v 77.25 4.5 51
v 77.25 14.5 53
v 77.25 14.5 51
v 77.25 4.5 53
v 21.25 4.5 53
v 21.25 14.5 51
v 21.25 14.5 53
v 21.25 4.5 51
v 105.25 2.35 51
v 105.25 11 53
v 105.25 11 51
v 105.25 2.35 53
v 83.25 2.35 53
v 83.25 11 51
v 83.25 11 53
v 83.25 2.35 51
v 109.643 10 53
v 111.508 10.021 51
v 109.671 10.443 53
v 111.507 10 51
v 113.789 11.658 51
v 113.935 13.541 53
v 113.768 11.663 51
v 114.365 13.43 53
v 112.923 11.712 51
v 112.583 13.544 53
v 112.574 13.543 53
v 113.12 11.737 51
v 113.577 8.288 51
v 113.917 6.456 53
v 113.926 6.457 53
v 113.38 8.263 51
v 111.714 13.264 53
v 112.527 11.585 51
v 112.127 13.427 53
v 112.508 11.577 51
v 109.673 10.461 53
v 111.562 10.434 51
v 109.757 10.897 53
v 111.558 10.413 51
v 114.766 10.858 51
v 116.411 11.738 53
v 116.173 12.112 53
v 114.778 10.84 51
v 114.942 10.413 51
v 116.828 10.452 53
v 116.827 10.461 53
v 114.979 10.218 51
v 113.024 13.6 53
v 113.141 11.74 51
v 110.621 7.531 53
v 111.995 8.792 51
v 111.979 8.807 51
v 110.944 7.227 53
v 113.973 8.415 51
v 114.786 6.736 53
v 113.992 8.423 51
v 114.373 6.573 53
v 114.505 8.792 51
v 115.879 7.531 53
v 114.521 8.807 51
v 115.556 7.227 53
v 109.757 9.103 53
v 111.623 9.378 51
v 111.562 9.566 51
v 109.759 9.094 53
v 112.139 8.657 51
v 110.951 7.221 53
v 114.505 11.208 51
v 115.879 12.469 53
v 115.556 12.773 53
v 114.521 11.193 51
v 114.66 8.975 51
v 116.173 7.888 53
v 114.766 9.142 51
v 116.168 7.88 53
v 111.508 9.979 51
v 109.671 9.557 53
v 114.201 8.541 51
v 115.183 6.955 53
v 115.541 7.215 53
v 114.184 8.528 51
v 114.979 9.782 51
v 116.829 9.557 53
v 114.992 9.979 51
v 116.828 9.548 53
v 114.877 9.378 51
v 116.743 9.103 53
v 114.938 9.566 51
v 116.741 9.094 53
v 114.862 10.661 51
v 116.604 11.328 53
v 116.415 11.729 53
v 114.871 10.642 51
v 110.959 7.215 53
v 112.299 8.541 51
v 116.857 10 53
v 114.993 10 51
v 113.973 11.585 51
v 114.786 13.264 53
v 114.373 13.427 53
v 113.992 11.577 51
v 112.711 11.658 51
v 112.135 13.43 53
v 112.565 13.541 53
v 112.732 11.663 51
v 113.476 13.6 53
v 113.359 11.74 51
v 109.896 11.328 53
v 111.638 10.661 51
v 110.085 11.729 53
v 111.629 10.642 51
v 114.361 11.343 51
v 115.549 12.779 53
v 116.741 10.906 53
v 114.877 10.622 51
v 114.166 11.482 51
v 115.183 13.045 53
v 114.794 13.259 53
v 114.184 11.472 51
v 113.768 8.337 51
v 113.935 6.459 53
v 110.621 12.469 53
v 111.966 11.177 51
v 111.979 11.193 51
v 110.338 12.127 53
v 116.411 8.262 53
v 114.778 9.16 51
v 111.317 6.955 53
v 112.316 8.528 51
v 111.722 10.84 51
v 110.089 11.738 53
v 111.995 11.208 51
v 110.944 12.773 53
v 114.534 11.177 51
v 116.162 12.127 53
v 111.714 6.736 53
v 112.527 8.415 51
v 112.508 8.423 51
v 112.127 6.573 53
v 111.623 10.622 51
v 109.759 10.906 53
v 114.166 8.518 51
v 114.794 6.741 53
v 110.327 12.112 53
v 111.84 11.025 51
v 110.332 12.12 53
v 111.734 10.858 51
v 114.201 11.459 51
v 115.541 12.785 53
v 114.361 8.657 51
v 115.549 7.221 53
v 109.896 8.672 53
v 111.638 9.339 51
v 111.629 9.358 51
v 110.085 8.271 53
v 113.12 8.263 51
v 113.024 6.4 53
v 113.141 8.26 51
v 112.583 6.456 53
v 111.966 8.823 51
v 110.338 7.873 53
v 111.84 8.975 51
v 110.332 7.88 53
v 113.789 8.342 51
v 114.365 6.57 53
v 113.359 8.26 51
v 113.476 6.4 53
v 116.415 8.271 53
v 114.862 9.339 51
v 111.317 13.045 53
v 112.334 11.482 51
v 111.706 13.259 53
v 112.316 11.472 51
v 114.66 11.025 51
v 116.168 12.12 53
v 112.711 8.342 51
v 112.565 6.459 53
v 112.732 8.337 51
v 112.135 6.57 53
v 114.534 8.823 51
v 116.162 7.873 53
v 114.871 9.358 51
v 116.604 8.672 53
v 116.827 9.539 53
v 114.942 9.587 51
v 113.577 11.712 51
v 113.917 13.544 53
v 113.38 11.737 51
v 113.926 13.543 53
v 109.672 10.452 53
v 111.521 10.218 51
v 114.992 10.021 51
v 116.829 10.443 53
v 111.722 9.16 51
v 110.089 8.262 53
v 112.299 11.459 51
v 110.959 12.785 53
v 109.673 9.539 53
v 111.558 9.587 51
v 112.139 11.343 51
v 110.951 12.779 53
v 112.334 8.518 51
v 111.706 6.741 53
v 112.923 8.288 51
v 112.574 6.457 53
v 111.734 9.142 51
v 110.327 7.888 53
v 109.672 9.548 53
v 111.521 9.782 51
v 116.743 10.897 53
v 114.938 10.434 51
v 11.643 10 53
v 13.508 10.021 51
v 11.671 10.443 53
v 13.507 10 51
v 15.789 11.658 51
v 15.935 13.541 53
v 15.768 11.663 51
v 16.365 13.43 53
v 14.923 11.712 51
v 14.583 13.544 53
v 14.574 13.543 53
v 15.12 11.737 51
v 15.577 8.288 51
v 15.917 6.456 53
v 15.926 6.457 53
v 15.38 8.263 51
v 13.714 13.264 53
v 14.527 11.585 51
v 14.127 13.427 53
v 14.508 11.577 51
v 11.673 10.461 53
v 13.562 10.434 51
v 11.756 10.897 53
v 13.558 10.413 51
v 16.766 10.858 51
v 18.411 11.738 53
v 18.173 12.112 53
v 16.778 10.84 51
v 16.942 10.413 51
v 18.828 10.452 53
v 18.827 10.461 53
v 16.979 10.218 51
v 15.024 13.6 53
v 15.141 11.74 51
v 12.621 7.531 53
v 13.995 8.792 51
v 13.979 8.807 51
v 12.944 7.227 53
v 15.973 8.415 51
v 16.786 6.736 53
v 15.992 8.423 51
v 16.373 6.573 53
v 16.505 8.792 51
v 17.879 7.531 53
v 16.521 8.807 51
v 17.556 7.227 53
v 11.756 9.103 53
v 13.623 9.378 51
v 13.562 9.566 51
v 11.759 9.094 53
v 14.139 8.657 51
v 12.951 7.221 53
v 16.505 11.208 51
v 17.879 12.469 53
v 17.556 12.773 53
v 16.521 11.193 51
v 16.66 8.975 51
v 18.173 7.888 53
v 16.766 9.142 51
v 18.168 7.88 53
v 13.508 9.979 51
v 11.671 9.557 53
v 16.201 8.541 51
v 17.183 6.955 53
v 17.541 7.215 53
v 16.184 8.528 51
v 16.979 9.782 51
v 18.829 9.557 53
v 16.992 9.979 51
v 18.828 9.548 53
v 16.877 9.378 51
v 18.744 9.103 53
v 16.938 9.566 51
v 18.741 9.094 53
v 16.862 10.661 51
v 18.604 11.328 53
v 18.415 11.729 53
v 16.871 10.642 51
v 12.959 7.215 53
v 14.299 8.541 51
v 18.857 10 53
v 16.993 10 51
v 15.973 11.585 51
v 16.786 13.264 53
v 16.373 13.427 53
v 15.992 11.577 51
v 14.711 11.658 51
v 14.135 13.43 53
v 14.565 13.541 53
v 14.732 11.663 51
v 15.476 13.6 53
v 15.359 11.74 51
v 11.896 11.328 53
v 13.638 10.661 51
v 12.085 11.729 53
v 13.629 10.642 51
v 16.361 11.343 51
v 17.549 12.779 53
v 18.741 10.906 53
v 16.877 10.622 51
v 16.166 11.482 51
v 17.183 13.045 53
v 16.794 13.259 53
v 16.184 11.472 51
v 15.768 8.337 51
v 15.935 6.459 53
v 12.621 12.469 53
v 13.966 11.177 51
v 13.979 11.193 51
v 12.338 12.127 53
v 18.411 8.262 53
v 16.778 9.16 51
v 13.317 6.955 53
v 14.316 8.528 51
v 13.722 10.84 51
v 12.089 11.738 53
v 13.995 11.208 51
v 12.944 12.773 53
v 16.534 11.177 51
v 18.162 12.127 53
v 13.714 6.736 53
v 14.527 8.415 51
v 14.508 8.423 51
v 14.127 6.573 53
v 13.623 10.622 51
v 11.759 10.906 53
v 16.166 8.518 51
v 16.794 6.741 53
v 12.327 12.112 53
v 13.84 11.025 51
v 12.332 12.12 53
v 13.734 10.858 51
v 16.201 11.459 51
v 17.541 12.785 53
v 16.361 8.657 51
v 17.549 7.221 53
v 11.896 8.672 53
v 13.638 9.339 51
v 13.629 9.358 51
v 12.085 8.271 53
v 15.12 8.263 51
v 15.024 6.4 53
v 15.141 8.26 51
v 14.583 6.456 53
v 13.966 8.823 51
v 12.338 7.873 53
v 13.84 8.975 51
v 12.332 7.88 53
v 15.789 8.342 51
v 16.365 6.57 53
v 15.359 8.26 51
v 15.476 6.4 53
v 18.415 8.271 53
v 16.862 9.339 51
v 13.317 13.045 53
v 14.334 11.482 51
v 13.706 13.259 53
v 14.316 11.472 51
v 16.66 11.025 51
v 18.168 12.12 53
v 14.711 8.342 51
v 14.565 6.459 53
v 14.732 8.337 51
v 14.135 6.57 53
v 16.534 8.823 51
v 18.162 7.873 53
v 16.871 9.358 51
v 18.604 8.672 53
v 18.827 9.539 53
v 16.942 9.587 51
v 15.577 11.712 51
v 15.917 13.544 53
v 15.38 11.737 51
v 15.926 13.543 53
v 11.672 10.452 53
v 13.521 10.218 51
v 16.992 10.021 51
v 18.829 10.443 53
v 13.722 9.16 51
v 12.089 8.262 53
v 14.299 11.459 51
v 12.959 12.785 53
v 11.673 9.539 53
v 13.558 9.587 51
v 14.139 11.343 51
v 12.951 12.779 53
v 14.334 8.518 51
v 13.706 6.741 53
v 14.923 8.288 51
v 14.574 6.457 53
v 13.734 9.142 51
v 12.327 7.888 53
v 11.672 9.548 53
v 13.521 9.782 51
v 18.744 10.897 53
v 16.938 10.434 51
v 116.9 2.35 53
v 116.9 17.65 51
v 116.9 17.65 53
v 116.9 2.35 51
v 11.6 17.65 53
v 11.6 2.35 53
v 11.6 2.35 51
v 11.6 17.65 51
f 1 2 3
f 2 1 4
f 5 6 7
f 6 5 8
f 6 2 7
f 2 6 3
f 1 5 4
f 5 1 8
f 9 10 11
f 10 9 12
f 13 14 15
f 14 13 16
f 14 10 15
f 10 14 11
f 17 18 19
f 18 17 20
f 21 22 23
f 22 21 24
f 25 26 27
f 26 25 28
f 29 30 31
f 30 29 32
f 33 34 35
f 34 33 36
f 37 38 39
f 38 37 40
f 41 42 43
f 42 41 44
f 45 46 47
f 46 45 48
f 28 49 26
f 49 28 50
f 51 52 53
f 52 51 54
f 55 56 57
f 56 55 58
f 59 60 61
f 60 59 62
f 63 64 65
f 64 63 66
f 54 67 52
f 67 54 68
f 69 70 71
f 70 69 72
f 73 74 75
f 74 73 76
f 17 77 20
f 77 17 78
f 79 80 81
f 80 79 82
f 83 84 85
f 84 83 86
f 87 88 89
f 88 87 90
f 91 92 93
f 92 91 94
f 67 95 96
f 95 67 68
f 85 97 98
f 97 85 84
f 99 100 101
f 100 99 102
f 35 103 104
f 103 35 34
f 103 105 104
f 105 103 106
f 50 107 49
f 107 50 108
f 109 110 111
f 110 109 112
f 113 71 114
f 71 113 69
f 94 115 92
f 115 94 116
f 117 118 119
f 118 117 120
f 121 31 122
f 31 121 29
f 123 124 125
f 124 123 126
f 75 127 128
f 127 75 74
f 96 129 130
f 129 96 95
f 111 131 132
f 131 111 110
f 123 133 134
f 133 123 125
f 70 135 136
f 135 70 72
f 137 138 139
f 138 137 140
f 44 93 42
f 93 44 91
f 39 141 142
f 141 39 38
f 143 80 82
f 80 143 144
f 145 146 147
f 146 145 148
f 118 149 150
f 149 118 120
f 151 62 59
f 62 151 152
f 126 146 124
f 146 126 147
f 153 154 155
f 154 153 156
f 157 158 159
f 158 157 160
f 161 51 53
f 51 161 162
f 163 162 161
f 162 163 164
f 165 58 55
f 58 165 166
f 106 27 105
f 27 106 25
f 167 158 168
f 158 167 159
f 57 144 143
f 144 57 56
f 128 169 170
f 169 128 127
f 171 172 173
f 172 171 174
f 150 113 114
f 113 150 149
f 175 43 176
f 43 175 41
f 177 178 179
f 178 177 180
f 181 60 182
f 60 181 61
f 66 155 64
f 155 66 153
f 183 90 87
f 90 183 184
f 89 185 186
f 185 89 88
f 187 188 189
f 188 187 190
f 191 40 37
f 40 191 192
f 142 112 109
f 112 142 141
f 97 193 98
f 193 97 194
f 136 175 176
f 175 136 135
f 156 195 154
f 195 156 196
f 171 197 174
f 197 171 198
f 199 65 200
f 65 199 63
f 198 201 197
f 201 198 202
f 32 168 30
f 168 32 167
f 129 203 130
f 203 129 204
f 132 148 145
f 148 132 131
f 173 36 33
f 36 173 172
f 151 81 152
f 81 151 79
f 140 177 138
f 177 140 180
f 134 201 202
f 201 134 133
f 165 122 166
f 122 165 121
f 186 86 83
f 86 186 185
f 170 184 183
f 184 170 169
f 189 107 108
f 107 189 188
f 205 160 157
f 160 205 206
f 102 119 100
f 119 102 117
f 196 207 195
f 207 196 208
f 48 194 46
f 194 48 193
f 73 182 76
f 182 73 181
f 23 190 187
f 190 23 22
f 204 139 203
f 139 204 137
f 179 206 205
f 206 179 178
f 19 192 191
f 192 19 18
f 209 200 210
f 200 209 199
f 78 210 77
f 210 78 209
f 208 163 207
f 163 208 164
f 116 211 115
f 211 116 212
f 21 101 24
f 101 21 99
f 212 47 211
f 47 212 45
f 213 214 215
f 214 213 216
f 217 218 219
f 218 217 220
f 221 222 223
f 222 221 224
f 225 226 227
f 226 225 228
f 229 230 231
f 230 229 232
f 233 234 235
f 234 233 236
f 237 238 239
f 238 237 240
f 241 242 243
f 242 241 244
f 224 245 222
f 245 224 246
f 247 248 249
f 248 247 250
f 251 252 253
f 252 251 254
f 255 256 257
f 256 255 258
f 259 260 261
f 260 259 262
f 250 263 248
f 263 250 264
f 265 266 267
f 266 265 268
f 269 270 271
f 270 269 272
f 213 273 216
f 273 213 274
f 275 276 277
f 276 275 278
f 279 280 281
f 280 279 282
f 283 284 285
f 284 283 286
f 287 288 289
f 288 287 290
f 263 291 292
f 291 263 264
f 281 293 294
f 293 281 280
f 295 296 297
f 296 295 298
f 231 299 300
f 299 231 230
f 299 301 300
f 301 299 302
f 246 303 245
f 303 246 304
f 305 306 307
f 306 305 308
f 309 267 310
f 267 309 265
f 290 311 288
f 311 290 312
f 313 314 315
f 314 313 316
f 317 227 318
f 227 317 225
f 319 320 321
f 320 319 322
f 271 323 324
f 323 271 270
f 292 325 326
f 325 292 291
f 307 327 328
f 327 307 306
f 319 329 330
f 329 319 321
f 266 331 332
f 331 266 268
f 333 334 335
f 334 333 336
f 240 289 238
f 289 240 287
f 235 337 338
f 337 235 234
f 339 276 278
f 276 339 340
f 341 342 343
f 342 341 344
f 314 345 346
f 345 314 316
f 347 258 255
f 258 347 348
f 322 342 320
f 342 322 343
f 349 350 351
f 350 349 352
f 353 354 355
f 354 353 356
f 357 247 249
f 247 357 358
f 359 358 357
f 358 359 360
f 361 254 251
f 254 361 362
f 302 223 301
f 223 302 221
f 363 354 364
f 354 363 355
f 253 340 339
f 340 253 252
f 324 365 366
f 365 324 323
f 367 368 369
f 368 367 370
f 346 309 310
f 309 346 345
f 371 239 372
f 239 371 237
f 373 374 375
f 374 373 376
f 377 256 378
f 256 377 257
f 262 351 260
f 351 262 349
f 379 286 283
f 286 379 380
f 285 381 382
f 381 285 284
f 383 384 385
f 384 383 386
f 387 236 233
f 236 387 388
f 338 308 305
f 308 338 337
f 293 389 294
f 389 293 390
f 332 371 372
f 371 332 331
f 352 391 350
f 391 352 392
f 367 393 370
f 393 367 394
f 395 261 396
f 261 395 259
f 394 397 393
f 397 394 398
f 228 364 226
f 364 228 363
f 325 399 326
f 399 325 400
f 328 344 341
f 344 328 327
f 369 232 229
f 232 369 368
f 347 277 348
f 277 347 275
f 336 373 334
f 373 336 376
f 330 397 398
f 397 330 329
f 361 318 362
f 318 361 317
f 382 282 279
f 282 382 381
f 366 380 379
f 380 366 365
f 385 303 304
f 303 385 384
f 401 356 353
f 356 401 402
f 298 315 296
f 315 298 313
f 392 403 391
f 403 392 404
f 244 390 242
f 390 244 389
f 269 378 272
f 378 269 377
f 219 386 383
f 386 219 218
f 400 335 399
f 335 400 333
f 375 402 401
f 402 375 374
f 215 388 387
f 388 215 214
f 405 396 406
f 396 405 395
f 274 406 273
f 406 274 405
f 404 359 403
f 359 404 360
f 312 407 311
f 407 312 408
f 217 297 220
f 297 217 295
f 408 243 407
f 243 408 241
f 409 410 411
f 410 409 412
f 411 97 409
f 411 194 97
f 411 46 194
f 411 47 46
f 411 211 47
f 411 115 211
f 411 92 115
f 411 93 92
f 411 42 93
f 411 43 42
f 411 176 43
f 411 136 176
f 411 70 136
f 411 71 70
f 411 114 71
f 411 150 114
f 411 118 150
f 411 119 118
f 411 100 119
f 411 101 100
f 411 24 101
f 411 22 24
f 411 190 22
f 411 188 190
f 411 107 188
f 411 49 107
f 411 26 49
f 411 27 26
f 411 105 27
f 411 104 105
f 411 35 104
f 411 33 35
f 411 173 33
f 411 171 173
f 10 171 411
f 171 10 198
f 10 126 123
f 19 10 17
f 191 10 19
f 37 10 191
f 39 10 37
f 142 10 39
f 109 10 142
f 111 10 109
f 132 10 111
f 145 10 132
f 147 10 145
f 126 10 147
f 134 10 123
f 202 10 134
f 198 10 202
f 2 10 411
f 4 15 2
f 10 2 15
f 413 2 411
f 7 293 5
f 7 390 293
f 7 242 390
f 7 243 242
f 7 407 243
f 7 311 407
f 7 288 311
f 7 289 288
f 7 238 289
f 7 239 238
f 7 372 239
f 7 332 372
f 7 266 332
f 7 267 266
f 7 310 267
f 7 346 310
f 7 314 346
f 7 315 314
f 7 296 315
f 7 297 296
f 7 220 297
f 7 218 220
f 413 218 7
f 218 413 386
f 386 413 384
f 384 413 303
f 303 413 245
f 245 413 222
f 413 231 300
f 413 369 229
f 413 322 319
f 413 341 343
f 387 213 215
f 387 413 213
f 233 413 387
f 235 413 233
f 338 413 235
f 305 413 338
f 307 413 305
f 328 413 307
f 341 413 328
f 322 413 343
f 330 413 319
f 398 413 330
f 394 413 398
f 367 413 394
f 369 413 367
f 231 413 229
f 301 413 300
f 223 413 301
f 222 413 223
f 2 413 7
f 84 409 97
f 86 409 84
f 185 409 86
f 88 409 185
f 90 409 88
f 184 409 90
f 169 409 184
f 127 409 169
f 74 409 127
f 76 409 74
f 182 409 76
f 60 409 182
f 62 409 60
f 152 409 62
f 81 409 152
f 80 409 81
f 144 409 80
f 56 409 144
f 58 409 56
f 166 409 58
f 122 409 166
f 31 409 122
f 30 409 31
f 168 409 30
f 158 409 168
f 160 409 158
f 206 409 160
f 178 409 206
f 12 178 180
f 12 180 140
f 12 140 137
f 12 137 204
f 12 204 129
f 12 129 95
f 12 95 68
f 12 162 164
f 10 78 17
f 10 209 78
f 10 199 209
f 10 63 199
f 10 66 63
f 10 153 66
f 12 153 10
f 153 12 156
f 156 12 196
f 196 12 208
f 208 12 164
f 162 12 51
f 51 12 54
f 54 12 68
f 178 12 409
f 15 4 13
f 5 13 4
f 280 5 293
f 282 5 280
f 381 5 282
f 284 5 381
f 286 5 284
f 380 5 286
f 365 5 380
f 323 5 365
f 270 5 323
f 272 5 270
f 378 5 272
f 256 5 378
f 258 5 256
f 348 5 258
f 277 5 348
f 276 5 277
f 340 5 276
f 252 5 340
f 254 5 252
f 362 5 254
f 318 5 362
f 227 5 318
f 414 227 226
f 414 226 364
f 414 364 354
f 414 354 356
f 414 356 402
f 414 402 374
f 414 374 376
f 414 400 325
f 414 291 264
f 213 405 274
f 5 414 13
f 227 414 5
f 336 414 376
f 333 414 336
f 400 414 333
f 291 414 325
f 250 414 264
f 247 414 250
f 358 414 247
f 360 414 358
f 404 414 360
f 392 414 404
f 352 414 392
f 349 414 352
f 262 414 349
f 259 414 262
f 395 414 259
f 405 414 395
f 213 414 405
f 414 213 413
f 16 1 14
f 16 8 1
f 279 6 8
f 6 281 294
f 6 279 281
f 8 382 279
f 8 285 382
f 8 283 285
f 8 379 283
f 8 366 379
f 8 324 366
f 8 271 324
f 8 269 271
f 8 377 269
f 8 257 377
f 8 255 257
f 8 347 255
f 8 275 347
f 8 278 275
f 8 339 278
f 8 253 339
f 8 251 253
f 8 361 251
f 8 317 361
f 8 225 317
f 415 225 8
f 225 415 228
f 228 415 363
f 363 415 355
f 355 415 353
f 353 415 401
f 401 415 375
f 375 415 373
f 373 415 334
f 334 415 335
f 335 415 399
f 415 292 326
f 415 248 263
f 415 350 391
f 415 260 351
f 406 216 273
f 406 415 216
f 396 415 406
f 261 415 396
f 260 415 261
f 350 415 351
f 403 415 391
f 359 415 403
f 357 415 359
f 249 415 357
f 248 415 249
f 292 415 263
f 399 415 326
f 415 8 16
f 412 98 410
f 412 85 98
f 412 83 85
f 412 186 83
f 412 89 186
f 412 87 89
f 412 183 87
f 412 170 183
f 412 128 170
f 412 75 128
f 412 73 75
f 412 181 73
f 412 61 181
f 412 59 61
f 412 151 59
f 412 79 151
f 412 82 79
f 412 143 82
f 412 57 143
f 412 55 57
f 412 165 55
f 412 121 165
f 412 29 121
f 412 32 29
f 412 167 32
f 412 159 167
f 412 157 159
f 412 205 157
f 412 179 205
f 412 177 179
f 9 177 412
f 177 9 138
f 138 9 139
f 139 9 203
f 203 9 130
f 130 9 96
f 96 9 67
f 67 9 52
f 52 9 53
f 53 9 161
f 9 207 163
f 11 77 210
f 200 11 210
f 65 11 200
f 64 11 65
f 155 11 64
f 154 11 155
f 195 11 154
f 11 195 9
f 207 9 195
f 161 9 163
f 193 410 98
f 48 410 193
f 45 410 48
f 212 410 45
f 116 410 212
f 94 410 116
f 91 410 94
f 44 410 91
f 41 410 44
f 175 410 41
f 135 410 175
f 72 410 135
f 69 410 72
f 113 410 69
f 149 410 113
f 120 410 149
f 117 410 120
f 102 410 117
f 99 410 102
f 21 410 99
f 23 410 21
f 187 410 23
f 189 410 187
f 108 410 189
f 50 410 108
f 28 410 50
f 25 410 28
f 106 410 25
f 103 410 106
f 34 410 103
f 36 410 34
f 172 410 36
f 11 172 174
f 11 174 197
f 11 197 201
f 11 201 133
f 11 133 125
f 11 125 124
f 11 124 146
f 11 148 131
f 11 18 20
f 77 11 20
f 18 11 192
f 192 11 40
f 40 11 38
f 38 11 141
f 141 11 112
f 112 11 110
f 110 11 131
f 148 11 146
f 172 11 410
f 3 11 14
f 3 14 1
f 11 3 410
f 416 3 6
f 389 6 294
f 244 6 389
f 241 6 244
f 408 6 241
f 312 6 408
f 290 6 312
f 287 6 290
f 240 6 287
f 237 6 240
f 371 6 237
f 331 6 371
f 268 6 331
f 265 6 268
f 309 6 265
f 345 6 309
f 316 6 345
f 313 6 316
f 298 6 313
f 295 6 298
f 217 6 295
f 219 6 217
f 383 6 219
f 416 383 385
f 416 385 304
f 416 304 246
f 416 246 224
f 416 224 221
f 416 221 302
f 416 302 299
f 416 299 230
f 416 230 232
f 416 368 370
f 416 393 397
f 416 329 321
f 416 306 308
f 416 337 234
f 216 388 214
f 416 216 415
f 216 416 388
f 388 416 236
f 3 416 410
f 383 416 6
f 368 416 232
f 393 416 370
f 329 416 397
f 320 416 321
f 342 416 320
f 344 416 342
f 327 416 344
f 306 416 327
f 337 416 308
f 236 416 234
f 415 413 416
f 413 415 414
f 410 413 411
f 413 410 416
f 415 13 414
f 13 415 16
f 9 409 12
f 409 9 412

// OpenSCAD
include<../sixinch_library.scad>

print_frontplate_sml = false;
print_cabinet_sml    = false;
print_lid            = false;
print_rear           = true;


Vent_Length          = 22;
Vent_Frequency       = 6;
Vent_Thickness       = 3;
standoff_hole_size   = 2.3;//2.3 for m2.5, 2.8 for m3
Depth                = 50; //Depth of the case min is somewhere around 98
hp                   = 4; //How many hp units you want this to be min is prob 5

if(print_frontplate_sml){ // Frontplate //
    w=boffset-gauge_box;
    square_hole        = [];
    round_hole         = [[w+20,hp*2.5,5],[w+35,hp*2.5,5],[w+50,hp*2.5,5],[w+65,hp*2.5,5],
        [w+85,hp*2.5,6.5]];
    round_peg          = [];   
    screw_side_front   = [hp/2];
    screw_top          = [];
    screw_bottom_front = [];
    
    frontplate(hp,square_hole,round_hole,round_peg,screw_side_front,screw_top,screw_bottom_front);
}

if(print_cabinet_sml){ // Cabinet //  
    w=pi_offset_x;
    h=pi_offset_y;
    screw_bottom_front = [];
    screw_side_front   = [hp/2];
    round_peg          = [[84,Depth-19,6,standoff_hole_size,6]];
    cabinet(Depth,hp,screw_bottom_front,round_peg,screw_side_front);
}

if(print_lid){ // Lid // 
    screw_front = [];//mm
    screw_back  = [];//mm
    lid(Depth,hp,screw_front,screw_back);        
}

if(print_rear){  // Back plate //    
    square_hole  = [
        [10,2.5,56,10],//24
        [72,0,22,9],//molex
    ];
    round_hole   = [];
    screw_top    = [];//mm
    screw_bottom = [];//mm
    screw_side   = [hp/2];
    back_plate(hp,Depth,screw_top,screw_bottom,screw_side,square_hole,round_hole);
}  
